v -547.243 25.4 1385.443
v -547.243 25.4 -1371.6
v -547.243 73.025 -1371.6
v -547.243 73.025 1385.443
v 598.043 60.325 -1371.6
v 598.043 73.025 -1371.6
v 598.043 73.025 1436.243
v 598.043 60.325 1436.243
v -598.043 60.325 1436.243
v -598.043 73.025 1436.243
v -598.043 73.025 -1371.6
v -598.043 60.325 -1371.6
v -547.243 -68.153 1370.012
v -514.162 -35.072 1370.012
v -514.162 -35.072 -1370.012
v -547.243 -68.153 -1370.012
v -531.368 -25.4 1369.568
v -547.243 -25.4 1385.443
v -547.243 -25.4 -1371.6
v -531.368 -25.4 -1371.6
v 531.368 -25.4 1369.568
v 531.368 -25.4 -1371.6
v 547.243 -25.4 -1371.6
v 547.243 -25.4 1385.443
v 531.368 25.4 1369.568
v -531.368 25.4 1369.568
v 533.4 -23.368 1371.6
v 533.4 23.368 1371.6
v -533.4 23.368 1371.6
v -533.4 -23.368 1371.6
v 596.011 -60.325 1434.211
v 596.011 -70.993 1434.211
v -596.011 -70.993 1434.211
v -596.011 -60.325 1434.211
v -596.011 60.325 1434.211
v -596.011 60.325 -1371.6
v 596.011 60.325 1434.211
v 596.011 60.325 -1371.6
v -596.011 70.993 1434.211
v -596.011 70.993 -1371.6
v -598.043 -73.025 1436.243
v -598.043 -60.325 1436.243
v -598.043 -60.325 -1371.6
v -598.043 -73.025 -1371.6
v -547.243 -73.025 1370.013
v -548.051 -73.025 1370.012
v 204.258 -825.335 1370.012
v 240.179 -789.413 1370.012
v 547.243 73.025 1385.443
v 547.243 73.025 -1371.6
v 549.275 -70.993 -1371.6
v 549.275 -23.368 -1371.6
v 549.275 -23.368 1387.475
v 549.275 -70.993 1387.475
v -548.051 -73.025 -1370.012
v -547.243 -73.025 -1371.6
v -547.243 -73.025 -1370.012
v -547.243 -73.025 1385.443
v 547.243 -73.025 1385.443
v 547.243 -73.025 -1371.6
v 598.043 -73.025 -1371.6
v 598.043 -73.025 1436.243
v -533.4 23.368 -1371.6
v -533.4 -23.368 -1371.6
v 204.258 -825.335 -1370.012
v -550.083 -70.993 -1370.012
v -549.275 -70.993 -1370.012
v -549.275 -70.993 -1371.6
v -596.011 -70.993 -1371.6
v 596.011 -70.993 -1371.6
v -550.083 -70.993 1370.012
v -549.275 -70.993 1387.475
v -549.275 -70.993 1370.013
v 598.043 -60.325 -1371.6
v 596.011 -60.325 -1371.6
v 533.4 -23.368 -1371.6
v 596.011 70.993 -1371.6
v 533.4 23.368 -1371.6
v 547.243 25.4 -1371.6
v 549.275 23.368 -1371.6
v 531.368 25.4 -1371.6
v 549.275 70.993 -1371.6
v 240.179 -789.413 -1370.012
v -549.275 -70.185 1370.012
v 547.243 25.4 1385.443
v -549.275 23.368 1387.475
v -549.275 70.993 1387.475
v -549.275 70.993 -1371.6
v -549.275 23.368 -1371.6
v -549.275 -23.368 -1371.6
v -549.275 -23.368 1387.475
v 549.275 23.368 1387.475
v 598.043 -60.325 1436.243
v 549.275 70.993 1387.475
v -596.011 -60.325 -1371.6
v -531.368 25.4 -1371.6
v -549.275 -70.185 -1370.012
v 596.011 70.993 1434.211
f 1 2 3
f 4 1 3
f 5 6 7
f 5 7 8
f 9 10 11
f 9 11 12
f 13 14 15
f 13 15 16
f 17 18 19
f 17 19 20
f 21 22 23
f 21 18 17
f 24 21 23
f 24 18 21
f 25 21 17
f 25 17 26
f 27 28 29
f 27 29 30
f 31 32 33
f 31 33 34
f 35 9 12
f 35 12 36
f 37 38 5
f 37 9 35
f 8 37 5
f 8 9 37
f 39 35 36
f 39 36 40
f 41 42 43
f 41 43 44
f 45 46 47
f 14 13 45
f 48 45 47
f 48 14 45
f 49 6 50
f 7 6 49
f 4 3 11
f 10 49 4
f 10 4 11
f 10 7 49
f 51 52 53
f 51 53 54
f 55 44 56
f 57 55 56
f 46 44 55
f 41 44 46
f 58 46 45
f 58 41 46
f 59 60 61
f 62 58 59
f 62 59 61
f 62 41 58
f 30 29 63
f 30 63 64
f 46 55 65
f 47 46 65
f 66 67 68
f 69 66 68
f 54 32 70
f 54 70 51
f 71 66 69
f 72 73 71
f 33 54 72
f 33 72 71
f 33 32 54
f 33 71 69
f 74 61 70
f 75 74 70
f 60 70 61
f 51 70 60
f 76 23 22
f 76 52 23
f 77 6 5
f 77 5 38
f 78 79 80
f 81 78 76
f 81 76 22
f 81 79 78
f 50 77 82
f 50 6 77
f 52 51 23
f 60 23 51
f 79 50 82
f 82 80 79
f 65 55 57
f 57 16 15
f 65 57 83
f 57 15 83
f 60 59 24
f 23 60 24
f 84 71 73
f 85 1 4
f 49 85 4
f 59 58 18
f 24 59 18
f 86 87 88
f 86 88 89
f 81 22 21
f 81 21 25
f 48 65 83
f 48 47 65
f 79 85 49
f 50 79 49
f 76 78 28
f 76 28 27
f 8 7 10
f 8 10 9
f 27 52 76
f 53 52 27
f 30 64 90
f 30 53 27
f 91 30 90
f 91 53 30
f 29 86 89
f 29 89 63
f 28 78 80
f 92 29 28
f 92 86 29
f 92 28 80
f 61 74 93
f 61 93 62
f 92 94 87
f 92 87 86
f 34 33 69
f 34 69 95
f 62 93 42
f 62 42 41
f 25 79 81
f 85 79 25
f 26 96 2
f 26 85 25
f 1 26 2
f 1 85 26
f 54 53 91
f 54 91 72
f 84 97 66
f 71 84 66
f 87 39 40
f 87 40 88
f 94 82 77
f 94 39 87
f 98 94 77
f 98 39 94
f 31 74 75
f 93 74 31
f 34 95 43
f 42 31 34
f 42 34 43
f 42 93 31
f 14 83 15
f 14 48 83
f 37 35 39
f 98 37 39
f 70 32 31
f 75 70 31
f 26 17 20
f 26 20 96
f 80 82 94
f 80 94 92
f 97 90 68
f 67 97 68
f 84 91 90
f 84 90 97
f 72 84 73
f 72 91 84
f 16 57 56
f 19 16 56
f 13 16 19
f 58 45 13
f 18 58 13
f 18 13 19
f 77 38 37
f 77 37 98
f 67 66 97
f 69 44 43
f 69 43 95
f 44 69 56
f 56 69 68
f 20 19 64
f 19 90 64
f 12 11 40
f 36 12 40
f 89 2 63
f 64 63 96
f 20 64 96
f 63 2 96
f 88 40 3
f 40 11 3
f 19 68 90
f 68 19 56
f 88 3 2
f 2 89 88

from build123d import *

# Parameters (mm, degrees)
F5_DEPTH = 1370.0125


# Not quite as in the source:
# - a variable given as a bare number and used for a length is read in inches; the dataset says mm whatever the document's units were


with BuildPart() as f3:
    # F3: sweep along a path in F1
    with BuildLine(Plane.XZ) as f3_path:
        Line((-533.4, -1371.6), (-533.4, 1371.6))
        Line((-533.4, 1371.6), (533.4, 1371.6))
        Line((533.4, 1371.6), (533.4, -1371.6))
    # F2 (on Top) → F3 (sweep)
    with BuildSketch(Plane.XY):
        Polygon((-549.275, 23.368), (-533.4, 23.368), (-533.4, -23.368), (-549.275, -23.368), (-549.275, -70.993), (-596.011, -70.993), (-596.011, -60.325), (-598.043, -60.325), (-598.043, -73.025), (-547.243, -73.025), (-547.243, -25.4), (-531.368, -25.4), (-531.368, 25.4), (-547.243, 25.4), (-547.243, 73.025), (-598.043, 73.025), (-598.043, 60.325), (-596.011, 60.325), (-596.011, 70.993), (-549.275, 70.993), align=None)
    sweep(path=f3_path.line, transition=Transition.RIGHT)

    # F4 (on Top) → F5 (join, symmetric)
    with BuildSketch(Plane.XY):
        Polygon((240.1792460268, -789.4134896855), (-514.1622681431, -35.0719755157), (-550.0832926273, -70.993), (204.2582215425, -825.3345141698), align=None)
    extrude(amount=F5_DEPTH, both=True)


solid = f3.part
